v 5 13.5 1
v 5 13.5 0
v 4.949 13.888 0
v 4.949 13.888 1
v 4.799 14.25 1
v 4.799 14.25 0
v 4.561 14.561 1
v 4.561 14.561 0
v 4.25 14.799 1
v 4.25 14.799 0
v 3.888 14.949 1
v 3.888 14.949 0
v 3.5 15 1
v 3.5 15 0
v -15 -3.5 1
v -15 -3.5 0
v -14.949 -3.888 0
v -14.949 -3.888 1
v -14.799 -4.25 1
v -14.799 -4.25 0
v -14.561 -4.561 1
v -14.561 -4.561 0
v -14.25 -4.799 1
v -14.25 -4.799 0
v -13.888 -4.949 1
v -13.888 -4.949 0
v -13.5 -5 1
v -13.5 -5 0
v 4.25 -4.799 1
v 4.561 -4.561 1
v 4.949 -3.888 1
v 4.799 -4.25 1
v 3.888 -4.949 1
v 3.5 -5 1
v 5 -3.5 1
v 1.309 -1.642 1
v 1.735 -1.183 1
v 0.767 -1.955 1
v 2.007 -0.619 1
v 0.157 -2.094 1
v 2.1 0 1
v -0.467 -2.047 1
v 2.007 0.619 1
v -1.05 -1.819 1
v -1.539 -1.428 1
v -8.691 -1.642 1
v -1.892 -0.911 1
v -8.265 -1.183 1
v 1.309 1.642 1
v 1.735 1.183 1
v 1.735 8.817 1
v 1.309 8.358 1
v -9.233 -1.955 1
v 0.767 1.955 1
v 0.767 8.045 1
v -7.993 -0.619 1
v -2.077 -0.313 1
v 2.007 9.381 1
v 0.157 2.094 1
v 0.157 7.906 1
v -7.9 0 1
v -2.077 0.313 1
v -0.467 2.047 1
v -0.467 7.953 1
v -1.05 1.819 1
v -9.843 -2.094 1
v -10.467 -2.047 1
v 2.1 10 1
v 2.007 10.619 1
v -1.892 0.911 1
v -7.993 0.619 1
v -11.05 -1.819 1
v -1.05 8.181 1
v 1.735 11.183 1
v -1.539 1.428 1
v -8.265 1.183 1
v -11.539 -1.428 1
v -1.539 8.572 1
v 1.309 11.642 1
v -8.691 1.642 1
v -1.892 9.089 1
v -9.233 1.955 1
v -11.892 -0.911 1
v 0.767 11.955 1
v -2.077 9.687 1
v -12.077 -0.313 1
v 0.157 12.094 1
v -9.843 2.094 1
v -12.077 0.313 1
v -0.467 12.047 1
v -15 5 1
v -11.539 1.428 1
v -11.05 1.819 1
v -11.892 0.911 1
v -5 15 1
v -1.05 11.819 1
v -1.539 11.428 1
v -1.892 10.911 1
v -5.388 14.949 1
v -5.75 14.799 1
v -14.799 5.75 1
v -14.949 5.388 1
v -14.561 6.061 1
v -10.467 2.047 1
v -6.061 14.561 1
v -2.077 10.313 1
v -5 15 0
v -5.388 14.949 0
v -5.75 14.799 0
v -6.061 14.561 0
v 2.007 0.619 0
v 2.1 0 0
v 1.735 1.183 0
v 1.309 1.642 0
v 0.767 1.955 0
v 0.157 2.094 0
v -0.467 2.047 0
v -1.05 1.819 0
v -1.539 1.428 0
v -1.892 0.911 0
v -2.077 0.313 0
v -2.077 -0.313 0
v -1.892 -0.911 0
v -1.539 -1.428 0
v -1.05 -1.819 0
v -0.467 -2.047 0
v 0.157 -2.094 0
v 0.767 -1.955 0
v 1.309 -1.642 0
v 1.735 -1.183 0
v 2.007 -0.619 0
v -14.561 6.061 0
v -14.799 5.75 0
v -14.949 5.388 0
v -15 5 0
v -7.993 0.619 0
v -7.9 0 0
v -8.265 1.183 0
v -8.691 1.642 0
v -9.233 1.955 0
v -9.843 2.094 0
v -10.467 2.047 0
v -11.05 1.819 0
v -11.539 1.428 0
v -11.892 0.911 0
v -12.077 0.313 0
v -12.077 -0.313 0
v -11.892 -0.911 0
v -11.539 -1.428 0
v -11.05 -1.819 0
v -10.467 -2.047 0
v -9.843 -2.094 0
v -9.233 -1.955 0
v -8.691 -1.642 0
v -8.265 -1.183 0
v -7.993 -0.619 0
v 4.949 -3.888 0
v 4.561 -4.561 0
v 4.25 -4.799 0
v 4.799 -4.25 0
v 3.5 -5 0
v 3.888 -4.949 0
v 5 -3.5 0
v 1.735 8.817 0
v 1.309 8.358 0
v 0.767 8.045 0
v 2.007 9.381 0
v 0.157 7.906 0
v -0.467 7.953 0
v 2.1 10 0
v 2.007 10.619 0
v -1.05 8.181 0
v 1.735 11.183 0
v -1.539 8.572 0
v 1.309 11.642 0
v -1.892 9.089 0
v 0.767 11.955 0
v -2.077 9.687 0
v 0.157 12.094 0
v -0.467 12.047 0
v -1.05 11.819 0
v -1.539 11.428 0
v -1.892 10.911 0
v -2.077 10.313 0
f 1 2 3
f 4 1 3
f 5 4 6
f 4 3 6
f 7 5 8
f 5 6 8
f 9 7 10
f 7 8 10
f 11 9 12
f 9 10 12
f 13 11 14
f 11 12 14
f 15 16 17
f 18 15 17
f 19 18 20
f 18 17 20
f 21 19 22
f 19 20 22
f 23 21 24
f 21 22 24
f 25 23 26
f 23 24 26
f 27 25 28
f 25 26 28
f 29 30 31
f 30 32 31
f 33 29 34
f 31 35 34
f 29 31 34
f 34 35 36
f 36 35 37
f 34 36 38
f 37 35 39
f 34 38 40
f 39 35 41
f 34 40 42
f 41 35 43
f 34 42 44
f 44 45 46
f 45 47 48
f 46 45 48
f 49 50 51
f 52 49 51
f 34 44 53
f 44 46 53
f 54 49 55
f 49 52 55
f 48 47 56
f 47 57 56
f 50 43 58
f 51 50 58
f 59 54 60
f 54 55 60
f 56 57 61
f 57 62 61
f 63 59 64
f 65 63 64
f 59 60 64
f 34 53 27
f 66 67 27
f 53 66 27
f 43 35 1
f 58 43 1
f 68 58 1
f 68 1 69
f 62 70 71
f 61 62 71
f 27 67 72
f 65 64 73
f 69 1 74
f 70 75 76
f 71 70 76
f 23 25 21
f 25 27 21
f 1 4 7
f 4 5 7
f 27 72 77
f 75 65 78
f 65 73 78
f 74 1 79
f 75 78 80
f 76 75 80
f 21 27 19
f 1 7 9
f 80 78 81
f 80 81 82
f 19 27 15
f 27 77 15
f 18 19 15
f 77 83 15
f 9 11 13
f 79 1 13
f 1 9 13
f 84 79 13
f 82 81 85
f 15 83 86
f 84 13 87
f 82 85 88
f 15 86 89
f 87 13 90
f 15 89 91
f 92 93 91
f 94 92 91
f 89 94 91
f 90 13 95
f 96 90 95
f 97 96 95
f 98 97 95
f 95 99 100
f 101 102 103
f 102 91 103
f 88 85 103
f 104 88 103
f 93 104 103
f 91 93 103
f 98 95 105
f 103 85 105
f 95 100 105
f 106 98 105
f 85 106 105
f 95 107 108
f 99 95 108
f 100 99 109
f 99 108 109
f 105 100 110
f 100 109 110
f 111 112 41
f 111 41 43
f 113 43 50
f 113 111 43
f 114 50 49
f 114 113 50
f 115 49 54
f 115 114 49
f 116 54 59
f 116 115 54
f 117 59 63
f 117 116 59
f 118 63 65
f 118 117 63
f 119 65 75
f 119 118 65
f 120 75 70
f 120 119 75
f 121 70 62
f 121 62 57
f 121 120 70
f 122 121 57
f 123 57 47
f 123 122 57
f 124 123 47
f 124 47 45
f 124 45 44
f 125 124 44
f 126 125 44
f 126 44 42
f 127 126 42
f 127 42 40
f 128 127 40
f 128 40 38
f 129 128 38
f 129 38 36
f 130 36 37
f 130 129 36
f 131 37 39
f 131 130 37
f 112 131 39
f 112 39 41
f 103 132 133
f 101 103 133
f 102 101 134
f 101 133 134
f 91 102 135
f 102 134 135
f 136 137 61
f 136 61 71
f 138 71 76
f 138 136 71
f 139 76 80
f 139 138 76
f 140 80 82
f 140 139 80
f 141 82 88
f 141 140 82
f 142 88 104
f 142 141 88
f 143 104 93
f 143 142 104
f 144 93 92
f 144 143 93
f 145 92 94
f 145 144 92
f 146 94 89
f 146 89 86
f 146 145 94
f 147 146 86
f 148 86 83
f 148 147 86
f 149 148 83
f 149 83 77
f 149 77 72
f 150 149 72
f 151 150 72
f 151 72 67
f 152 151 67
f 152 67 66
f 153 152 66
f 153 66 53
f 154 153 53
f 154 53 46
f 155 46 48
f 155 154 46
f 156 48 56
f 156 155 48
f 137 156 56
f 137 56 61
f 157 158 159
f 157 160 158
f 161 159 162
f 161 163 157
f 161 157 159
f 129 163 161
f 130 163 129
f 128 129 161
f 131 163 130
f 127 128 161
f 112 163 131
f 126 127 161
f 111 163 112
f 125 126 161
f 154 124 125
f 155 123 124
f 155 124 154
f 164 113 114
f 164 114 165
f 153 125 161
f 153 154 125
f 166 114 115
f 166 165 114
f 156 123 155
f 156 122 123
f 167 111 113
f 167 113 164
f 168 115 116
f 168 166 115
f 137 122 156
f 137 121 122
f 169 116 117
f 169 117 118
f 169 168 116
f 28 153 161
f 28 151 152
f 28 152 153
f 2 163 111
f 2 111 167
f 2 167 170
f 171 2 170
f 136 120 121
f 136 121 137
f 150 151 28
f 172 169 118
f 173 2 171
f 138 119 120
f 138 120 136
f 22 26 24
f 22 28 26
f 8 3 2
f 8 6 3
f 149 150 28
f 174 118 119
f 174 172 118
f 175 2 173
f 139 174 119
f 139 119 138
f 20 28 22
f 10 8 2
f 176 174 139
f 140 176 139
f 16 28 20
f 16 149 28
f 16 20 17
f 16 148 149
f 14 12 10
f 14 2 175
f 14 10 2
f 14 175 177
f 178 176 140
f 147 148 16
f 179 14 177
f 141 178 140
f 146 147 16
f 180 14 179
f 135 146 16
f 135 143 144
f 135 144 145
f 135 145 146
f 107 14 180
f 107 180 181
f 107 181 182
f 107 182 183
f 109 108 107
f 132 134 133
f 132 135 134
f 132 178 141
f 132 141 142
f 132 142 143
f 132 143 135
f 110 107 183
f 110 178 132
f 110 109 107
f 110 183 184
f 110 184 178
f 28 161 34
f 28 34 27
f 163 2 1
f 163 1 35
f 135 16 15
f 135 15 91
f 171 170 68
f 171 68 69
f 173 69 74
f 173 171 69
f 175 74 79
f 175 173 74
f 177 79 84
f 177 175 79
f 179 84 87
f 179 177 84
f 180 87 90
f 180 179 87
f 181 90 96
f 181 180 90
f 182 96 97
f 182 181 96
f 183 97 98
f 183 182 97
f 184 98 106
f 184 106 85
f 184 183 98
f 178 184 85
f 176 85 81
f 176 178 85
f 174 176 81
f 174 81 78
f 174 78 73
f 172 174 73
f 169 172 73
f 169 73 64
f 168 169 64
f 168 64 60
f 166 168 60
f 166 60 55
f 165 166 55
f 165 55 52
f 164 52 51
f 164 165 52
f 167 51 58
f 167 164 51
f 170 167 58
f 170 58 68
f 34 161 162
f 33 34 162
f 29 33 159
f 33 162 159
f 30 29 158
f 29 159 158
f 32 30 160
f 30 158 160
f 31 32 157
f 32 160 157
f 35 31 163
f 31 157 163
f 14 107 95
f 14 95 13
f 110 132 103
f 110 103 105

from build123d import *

# Parameters (mm, degrees)
SKETCH_R  = 2.1
PAD_DEPTH = 1


with BuildPart() as part:
    # Sketch → Pad (new body)
    with BuildSketch(Plane.XY):
        with BuildLine():
            Line((-5, 15), (3.5, 15))
            ThreePointArc((5, 13.5), (4.56066, 14.56066), (3.5, 15))
            Line((5, 13.5), (5, -3.5))
            ThreePointArc((3.5, -5), (4.56066, -4.56066), (5, -3.5))
            Line((3.5, -5), (-13.5, -5))
            ThreePointArc((-15, -3.5), (-14.56066, -4.56066), (-13.5, -5))
            Line((-15, -3.5), (-15, 5))
            ThreePointArc((-14.56066, 6.06066), (-14.885819, 5.574025), (-15, 5))
            Line((-14.56066, 6.06066), (-6.06066, 14.56066))
            ThreePointArc((-5, 15), (-5.574025, 14.885819), (-6.06066, 14.56066))
        make_face()
        with Locations((0, 10)):
            Circle(SKETCH_R, mode=Mode.SUBTRACT)
        with Locations((-10, 0)):
            Circle(SKETCH_R, mode=Mode.SUBTRACT)
        Circle(SKETCH_R, mode=Mode.SUBTRACT)
    extrude(amount=PAD_DEPTH)


solid = part.part
